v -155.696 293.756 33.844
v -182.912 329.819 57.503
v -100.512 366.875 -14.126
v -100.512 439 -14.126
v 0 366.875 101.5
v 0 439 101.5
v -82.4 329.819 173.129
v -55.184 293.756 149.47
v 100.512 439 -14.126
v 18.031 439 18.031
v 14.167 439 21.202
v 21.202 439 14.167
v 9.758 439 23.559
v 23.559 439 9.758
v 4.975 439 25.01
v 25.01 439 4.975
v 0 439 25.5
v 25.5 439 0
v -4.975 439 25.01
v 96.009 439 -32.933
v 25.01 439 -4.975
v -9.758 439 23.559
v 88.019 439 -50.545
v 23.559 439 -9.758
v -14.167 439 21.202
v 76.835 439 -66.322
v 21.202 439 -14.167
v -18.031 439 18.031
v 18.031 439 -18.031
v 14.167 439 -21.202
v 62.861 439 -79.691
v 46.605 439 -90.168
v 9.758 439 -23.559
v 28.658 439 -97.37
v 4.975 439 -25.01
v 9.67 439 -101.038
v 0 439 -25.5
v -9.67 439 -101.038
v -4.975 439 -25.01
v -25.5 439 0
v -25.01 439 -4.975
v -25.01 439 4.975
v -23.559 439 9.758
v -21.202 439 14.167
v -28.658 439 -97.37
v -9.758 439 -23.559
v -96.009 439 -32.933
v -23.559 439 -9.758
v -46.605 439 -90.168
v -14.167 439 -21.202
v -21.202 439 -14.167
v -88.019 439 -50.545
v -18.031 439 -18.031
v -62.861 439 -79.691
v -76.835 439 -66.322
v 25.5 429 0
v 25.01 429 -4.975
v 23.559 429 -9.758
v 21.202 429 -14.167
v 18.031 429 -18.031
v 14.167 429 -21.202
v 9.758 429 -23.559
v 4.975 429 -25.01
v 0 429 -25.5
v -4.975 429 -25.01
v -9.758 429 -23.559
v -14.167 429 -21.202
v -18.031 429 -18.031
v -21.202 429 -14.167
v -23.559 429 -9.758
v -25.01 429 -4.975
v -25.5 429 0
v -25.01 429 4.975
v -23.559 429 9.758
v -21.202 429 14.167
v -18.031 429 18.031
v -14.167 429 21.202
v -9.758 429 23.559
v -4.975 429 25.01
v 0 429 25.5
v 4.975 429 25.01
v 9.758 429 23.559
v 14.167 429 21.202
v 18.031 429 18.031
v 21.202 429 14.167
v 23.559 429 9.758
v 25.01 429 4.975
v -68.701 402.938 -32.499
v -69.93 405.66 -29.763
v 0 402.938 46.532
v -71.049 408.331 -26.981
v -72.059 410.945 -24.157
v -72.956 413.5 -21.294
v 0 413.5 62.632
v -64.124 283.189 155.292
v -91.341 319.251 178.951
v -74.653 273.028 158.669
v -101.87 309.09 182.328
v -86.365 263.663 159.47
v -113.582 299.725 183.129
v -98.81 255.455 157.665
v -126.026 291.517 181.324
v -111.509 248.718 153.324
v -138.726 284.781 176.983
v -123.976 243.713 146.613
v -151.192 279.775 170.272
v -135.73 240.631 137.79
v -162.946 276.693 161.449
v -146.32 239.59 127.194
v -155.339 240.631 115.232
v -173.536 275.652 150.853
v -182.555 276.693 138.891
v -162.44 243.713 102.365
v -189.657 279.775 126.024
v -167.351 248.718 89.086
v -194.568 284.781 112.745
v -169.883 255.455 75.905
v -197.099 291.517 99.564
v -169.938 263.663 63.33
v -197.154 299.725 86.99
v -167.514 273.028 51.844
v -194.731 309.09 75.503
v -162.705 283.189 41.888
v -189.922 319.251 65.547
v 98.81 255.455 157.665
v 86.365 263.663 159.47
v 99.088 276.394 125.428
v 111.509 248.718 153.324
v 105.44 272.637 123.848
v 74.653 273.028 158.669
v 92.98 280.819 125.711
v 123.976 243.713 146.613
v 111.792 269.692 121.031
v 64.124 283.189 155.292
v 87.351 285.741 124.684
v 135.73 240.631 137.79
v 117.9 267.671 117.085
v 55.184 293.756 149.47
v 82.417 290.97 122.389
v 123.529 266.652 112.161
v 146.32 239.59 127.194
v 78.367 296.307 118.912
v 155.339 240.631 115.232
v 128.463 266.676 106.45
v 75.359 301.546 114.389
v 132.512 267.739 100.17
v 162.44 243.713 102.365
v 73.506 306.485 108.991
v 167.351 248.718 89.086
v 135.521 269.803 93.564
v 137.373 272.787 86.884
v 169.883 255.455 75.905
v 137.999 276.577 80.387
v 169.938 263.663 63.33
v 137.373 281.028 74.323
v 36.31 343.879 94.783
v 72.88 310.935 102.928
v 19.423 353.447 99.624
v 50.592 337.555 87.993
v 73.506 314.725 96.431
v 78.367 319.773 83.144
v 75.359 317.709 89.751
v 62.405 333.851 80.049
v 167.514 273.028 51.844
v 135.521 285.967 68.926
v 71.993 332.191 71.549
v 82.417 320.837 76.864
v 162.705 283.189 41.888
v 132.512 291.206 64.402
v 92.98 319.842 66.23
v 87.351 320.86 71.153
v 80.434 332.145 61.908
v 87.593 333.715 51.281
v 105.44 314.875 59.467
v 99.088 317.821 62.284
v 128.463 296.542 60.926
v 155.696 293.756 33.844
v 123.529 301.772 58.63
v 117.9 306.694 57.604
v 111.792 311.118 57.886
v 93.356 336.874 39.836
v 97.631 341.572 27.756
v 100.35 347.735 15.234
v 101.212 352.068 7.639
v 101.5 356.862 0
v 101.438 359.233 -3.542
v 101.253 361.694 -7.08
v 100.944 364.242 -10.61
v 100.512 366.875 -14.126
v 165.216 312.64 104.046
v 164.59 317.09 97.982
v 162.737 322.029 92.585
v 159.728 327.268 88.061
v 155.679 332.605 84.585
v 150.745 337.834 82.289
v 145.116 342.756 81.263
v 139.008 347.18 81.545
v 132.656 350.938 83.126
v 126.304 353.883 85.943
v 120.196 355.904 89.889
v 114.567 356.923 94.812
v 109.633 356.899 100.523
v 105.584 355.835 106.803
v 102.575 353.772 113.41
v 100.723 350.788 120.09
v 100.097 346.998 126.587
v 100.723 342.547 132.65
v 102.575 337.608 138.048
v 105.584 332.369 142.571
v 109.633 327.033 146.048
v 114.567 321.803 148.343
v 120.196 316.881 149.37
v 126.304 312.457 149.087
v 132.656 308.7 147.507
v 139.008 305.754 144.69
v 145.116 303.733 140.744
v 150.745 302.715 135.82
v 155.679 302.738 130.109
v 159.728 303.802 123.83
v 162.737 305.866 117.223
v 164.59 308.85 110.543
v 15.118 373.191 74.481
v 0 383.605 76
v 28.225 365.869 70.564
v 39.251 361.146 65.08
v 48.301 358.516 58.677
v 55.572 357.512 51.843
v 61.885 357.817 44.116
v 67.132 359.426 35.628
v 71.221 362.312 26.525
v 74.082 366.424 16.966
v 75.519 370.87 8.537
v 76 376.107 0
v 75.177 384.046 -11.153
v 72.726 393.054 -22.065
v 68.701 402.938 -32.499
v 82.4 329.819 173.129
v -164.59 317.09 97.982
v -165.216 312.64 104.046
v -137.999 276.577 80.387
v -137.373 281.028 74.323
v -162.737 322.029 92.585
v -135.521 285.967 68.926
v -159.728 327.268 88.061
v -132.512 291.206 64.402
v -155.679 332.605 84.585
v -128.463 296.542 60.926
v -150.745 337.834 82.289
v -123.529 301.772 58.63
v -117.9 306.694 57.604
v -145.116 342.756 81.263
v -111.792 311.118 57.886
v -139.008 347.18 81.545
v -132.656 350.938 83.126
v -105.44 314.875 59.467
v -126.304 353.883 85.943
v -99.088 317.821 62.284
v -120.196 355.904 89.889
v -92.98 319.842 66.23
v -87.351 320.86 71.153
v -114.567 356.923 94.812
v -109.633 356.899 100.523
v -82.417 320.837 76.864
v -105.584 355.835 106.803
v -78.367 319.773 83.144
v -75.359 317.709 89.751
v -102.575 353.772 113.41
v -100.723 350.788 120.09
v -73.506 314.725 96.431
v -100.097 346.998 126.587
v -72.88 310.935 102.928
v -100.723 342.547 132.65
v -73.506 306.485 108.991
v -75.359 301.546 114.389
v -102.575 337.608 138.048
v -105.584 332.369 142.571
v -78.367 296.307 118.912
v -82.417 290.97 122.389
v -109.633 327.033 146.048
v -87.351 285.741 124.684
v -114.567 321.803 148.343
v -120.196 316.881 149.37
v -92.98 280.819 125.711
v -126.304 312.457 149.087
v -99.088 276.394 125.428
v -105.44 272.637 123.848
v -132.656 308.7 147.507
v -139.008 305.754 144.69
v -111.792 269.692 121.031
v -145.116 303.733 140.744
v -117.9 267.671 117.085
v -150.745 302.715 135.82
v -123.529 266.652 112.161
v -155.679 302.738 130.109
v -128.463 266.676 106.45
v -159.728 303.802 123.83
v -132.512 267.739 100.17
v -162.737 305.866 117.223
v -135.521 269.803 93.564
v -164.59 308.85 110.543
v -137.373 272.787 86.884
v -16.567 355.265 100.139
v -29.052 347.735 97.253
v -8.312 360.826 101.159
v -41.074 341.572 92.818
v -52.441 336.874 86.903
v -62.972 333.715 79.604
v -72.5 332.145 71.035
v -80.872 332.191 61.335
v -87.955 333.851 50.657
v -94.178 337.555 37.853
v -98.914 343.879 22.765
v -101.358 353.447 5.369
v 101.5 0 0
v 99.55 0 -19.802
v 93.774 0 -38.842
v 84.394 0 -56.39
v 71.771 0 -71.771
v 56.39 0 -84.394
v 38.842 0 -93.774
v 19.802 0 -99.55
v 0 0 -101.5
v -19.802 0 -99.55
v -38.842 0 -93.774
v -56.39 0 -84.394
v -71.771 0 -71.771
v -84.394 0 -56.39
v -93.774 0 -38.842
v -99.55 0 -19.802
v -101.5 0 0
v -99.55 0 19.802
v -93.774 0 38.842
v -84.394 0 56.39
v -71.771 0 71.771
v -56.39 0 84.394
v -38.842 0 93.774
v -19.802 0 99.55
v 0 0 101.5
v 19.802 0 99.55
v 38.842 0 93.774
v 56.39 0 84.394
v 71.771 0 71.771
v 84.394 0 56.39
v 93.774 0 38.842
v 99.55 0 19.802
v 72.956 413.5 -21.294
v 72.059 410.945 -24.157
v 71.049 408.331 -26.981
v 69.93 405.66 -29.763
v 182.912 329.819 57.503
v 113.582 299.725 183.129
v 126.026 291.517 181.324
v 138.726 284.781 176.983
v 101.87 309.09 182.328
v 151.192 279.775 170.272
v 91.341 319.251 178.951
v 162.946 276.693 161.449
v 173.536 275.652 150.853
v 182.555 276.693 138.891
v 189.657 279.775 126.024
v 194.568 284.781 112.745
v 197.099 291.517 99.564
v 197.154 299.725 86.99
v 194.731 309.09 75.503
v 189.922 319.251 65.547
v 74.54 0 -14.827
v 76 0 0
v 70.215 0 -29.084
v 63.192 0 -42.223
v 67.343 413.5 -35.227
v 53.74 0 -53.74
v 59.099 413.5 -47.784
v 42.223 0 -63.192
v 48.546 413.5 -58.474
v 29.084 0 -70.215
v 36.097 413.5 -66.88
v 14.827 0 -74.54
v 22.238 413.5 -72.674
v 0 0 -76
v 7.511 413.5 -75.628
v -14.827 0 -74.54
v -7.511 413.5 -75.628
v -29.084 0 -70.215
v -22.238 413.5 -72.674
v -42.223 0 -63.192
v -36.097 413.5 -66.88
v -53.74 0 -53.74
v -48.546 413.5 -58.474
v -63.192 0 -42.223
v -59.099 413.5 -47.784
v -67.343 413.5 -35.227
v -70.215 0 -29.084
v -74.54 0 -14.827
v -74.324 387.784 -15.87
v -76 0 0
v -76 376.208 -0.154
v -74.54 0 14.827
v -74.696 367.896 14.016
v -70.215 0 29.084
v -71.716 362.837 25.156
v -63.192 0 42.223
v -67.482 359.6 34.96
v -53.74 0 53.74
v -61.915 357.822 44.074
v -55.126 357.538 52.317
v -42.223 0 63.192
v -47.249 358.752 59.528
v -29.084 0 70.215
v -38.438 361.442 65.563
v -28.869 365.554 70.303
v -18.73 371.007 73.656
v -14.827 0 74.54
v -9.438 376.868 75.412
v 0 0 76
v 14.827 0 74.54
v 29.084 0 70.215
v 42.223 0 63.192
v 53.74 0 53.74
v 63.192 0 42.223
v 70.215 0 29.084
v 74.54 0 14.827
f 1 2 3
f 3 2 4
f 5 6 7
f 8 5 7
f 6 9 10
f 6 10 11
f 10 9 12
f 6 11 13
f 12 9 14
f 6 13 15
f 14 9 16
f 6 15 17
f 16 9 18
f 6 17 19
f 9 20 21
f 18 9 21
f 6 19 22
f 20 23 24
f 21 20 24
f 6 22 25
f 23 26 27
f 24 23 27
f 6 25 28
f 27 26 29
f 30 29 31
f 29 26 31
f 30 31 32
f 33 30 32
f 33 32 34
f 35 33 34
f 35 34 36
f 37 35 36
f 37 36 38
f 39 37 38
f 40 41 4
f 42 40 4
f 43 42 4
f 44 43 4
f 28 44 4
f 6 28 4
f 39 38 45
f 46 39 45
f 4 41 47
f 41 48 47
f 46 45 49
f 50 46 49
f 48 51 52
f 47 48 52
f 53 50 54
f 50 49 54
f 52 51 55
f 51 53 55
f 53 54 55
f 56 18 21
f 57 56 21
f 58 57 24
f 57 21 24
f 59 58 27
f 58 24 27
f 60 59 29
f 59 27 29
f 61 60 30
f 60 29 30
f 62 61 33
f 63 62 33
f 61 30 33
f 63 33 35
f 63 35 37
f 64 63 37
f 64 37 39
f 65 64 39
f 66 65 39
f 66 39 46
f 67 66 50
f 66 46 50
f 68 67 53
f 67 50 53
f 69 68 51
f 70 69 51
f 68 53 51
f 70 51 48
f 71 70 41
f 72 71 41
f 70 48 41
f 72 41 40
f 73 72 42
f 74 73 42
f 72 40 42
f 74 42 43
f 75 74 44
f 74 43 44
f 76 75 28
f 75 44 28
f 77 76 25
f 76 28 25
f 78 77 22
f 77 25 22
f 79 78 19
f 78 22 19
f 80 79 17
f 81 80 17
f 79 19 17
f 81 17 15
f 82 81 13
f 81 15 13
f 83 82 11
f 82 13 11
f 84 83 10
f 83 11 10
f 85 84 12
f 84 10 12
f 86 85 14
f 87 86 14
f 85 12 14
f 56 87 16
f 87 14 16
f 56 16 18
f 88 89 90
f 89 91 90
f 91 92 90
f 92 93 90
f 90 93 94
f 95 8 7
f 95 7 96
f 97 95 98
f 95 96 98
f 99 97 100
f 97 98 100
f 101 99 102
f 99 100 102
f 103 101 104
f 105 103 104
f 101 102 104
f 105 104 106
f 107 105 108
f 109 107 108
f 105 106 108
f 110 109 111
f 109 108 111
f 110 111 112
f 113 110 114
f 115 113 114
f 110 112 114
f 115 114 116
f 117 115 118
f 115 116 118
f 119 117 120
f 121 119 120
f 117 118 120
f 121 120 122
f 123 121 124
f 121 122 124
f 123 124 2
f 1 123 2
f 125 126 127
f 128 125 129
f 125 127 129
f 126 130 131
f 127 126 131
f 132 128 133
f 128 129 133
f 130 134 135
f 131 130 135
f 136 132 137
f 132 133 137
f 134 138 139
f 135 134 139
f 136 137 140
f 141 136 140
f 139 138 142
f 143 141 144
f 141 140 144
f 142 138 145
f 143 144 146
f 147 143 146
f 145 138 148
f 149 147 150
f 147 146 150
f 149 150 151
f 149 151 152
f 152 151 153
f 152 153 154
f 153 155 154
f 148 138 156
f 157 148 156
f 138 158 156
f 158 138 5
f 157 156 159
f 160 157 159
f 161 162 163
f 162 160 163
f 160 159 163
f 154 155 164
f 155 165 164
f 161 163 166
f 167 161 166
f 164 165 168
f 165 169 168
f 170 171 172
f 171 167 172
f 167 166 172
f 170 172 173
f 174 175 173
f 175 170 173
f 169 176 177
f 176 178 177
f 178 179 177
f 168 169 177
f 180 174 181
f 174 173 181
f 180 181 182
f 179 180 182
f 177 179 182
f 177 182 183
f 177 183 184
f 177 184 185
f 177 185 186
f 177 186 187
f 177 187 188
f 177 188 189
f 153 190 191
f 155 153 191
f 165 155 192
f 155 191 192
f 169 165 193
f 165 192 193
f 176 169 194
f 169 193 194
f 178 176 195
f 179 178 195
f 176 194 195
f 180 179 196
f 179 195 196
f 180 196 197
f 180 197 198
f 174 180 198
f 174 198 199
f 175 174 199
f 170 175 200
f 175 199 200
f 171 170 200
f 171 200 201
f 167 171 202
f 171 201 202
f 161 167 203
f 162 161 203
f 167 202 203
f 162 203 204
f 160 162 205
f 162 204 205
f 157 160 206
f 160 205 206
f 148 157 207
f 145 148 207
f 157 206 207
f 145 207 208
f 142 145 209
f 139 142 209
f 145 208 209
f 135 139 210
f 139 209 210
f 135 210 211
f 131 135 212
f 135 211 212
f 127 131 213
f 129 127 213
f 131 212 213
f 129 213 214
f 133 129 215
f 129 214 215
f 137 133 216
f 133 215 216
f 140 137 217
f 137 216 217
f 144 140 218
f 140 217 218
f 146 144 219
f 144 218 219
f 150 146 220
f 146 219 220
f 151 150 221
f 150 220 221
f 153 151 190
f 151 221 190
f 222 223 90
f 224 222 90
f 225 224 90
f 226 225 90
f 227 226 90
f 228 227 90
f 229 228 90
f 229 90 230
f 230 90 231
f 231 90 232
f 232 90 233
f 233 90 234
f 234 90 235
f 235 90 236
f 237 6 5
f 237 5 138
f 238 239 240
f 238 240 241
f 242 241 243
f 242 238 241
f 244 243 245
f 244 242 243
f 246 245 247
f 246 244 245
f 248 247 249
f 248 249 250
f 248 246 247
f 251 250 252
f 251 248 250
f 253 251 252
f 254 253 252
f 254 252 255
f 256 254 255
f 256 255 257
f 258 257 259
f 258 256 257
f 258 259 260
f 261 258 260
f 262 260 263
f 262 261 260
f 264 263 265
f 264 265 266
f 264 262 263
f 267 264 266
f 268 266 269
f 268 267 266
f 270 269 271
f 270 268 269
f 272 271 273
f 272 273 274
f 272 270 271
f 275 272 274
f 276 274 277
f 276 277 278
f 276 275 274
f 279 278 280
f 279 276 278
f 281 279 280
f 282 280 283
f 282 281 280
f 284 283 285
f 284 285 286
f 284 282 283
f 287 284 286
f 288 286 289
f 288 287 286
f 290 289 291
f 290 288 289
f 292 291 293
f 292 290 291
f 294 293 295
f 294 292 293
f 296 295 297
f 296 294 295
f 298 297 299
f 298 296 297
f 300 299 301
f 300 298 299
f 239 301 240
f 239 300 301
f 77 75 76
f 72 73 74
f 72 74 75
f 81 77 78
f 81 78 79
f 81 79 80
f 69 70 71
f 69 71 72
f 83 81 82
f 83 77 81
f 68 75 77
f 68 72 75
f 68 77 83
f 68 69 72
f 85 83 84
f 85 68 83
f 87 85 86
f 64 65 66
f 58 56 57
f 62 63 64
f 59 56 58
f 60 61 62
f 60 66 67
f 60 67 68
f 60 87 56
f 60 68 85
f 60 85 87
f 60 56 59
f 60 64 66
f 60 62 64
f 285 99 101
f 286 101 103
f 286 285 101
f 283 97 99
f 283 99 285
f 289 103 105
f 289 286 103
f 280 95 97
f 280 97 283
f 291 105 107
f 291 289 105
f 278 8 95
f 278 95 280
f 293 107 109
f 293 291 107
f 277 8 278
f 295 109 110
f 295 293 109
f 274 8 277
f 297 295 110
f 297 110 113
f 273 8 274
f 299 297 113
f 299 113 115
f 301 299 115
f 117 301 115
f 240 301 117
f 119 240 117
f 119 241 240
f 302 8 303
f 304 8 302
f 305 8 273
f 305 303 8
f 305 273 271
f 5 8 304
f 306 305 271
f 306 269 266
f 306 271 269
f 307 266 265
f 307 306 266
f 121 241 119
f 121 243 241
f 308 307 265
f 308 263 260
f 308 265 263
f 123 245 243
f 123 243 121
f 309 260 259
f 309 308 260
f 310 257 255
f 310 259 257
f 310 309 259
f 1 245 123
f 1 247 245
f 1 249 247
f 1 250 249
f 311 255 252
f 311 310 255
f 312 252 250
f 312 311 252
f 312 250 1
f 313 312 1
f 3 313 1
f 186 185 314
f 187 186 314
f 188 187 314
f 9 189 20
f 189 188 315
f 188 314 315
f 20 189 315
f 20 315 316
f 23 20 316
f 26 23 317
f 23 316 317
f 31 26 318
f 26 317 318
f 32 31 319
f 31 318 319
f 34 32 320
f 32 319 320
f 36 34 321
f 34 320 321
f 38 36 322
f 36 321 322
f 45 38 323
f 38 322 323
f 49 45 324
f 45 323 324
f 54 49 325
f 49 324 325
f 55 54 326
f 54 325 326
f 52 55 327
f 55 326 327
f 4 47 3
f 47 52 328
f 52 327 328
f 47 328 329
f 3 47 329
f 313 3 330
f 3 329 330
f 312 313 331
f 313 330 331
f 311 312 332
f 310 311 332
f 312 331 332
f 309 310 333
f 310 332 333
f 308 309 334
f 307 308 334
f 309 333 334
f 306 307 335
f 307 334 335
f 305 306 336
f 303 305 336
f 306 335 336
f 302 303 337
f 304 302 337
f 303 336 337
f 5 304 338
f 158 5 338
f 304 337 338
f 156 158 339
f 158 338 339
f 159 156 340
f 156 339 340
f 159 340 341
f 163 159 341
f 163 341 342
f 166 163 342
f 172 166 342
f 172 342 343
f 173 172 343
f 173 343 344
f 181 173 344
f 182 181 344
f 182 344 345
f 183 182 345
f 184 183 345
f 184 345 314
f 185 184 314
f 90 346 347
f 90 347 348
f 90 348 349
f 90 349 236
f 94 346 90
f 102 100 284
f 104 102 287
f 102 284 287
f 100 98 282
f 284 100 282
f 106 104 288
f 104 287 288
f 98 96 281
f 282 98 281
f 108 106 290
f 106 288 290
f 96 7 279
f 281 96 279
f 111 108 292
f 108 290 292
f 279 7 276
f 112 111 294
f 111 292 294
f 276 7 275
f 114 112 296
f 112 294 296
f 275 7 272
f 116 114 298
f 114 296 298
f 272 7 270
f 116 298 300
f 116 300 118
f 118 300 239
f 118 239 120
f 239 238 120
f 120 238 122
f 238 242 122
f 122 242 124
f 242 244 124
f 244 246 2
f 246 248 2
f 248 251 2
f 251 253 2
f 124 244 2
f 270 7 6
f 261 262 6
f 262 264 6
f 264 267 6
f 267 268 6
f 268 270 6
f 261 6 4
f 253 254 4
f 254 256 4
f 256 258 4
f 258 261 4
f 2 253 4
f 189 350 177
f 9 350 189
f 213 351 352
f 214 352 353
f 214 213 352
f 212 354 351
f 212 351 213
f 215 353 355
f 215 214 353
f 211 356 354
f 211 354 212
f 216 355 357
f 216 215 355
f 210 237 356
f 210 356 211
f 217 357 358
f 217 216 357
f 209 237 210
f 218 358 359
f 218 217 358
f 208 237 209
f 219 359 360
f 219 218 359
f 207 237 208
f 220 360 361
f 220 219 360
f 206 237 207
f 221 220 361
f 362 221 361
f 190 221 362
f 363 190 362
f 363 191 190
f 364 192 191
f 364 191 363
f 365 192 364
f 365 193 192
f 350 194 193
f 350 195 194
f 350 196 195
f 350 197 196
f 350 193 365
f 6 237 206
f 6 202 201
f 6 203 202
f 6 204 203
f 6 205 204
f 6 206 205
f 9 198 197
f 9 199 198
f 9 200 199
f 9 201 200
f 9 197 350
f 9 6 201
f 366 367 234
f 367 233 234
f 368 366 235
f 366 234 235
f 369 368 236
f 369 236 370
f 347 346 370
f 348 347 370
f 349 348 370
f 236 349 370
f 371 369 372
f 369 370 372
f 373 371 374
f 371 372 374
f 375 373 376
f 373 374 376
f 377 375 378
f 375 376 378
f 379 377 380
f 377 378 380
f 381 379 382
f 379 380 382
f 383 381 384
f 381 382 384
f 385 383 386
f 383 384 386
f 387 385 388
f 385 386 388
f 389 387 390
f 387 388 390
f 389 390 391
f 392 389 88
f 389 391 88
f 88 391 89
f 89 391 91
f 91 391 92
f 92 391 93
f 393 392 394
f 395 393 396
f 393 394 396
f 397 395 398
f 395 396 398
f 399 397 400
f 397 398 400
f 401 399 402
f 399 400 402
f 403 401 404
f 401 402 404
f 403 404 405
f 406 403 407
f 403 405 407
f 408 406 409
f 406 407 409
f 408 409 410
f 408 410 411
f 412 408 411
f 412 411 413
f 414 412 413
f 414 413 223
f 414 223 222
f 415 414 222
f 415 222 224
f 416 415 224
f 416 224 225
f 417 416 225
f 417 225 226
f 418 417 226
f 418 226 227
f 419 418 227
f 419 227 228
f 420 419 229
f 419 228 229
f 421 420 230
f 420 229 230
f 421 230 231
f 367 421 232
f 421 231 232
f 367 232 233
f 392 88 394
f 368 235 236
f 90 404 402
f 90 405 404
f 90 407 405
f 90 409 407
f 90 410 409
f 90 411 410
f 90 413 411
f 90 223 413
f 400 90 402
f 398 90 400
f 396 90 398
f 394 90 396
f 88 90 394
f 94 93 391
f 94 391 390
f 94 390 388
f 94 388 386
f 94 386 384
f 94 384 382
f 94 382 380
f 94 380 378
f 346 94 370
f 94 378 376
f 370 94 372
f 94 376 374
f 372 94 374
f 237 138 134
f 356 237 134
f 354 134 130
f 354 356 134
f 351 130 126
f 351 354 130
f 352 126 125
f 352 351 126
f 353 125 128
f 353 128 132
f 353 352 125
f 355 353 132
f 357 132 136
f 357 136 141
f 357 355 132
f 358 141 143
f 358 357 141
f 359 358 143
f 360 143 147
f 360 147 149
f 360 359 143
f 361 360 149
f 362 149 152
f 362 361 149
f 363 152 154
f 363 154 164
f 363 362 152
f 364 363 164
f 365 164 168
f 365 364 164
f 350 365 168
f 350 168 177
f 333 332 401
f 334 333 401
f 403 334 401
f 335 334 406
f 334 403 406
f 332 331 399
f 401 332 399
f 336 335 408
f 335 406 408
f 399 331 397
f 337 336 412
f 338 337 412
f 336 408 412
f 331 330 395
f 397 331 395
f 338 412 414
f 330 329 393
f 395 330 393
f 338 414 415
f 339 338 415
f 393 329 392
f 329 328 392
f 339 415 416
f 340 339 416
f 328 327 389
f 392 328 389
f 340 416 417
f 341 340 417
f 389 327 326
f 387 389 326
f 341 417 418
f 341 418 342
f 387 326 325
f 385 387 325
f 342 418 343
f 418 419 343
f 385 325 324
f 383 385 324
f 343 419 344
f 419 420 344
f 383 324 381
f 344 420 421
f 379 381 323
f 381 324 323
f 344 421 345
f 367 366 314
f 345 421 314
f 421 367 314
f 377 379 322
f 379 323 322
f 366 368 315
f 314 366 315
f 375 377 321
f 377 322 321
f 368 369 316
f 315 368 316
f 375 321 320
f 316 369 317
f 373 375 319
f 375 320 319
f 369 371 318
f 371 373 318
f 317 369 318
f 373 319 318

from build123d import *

# Parameters (mm, degrees)
SCHIZZO2_R                   = 25.5
TAGLIO_ESTRUSIONE1_DEPTH     = 10
ESTRUSIONE_ESTRUSIONE1_DEPTH = 51
TAGLIO_ESTRUSIONE2_DEPTH     = 51
SCHIZZO6_R                   = 38.5
TAGLIO_ESTRUSIONE3_DEPTH     = 51


with BuildPart() as part:
    # Schizzo1 → Rivoluzione1 (revolve)
    with BuildSketch(Plane.XY):
        Polygon((0, 439), (101.5, 439), (101.5, 0), (76, 0), (76, 413.5), (0, 413.5), align=None)
    revolve(axis=Axis((0, -167.269578169, 0), (0, 1, 0)))

    # Schizzo2 → Taglio-Estrusione1 (cut)
    with BuildSketch(Plane(origin=(0, 439, 0), x_dir=(1, 0, 0), z_dir=(0, 1, 0))):
        Circle(SCHIZZO2_R)
    extrude(amount=-TAGLIO_ESTRUSIONE1_DEPTH, mode=Mode.SUBTRACT)

    # Schizzo4 → Estrusione-Estrusione1 (add)
    with BuildSketch(Plane(origin=(190.786805103, 252.794995721, 165.848439427), x_dir=(0.656059029, 0, -0.75470958), z_dir=(0.533660262, 0.707106781, 0.463903788))):
        with BuildLine():
            Line((-76.603022393, 263.333642433), (-76.603022393, 108.927930028))
            ThreePointArc((-76.603022393, 108.927930028), (0, 32.324907635), (76.603022393, 108.927930028))
            Line((76.603022393, 108.927930028), (76.603022393, 263.333642433))
            Line((76.603022393, 263.333642433), (-76.603022393, 263.333642433))
        make_face()
    estrusione_estrusione1 = extrude(amount=-ESTRUSIONE_ESTRUSIONE1_DEPTH)

    # Schizzo5 → Taglio-Estrusione2 (cut)
    with BuildSketch(Plane(origin=(190.786805103, 252.794995721, 165.848439427), x_dir=(0.845698956, -0.44620463, -0.292736576), z_dir=(0.533660262, 0.707106781, 0.463903788))):
        with BuildLine():
            Line((-9.31111849, 132.840581346), (-106.745545148, 252.622284978))
            Line((-106.745545148, 252.622284978), (-225.596595186, 155.944882946))
            Line((-225.596595186, 155.944882946), (-128.162168528, 36.163179314))
            ThreePointArc((-128.162168528, 36.163179314), (-20.397942493, 25.076355311), (-9.31111849, 132.840581346))
        make_face()
    taglio_estrusione2 = extrude(amount=TAGLIO_ESTRUSIONE2_DEPTH, mode=Mode.SUBTRACT)

    # Schizzo6 → Taglio-Estrusione3 (cut)
    with BuildSketch(Plane(origin=(190.786805103, 252.794995721, 165.848439427), x_dir=(0.845698956, -0.44620463, -0.292736576), z_dir=(0.533660262, 0.707106781, 0.463903788))):
        with Locations((-68.736643509, 84.50188033)):
            Circle(SCHIZZO6_R)
    taglio_estrusione3 = extrude(amount=-TAGLIO_ESTRUSIONE3_DEPTH, mode=Mode.SUBTRACT)

    # Specchia1: Estrusione-Estrusione1, Taglio-Estrusione2, Taglio-Estrusione3 across plane
    add(estrusione_estrusione1.mirror(Plane(origin=(0, 0, 0), x_dir=(0, 0, 1), z_dir=(1, 0, 0))))
    add(taglio_estrusione2.mirror(Plane(origin=(0, 0, 0), x_dir=(0, 0, 1), z_dir=(1, 0, 0))), mode=Mode.SUBTRACT)
    add(taglio_estrusione3.mirror(Plane(origin=(0, 0, 0), x_dir=(0, 0, 1), z_dir=(1, 0, 0))), mode=Mode.SUBTRACT)


solid = part.part
